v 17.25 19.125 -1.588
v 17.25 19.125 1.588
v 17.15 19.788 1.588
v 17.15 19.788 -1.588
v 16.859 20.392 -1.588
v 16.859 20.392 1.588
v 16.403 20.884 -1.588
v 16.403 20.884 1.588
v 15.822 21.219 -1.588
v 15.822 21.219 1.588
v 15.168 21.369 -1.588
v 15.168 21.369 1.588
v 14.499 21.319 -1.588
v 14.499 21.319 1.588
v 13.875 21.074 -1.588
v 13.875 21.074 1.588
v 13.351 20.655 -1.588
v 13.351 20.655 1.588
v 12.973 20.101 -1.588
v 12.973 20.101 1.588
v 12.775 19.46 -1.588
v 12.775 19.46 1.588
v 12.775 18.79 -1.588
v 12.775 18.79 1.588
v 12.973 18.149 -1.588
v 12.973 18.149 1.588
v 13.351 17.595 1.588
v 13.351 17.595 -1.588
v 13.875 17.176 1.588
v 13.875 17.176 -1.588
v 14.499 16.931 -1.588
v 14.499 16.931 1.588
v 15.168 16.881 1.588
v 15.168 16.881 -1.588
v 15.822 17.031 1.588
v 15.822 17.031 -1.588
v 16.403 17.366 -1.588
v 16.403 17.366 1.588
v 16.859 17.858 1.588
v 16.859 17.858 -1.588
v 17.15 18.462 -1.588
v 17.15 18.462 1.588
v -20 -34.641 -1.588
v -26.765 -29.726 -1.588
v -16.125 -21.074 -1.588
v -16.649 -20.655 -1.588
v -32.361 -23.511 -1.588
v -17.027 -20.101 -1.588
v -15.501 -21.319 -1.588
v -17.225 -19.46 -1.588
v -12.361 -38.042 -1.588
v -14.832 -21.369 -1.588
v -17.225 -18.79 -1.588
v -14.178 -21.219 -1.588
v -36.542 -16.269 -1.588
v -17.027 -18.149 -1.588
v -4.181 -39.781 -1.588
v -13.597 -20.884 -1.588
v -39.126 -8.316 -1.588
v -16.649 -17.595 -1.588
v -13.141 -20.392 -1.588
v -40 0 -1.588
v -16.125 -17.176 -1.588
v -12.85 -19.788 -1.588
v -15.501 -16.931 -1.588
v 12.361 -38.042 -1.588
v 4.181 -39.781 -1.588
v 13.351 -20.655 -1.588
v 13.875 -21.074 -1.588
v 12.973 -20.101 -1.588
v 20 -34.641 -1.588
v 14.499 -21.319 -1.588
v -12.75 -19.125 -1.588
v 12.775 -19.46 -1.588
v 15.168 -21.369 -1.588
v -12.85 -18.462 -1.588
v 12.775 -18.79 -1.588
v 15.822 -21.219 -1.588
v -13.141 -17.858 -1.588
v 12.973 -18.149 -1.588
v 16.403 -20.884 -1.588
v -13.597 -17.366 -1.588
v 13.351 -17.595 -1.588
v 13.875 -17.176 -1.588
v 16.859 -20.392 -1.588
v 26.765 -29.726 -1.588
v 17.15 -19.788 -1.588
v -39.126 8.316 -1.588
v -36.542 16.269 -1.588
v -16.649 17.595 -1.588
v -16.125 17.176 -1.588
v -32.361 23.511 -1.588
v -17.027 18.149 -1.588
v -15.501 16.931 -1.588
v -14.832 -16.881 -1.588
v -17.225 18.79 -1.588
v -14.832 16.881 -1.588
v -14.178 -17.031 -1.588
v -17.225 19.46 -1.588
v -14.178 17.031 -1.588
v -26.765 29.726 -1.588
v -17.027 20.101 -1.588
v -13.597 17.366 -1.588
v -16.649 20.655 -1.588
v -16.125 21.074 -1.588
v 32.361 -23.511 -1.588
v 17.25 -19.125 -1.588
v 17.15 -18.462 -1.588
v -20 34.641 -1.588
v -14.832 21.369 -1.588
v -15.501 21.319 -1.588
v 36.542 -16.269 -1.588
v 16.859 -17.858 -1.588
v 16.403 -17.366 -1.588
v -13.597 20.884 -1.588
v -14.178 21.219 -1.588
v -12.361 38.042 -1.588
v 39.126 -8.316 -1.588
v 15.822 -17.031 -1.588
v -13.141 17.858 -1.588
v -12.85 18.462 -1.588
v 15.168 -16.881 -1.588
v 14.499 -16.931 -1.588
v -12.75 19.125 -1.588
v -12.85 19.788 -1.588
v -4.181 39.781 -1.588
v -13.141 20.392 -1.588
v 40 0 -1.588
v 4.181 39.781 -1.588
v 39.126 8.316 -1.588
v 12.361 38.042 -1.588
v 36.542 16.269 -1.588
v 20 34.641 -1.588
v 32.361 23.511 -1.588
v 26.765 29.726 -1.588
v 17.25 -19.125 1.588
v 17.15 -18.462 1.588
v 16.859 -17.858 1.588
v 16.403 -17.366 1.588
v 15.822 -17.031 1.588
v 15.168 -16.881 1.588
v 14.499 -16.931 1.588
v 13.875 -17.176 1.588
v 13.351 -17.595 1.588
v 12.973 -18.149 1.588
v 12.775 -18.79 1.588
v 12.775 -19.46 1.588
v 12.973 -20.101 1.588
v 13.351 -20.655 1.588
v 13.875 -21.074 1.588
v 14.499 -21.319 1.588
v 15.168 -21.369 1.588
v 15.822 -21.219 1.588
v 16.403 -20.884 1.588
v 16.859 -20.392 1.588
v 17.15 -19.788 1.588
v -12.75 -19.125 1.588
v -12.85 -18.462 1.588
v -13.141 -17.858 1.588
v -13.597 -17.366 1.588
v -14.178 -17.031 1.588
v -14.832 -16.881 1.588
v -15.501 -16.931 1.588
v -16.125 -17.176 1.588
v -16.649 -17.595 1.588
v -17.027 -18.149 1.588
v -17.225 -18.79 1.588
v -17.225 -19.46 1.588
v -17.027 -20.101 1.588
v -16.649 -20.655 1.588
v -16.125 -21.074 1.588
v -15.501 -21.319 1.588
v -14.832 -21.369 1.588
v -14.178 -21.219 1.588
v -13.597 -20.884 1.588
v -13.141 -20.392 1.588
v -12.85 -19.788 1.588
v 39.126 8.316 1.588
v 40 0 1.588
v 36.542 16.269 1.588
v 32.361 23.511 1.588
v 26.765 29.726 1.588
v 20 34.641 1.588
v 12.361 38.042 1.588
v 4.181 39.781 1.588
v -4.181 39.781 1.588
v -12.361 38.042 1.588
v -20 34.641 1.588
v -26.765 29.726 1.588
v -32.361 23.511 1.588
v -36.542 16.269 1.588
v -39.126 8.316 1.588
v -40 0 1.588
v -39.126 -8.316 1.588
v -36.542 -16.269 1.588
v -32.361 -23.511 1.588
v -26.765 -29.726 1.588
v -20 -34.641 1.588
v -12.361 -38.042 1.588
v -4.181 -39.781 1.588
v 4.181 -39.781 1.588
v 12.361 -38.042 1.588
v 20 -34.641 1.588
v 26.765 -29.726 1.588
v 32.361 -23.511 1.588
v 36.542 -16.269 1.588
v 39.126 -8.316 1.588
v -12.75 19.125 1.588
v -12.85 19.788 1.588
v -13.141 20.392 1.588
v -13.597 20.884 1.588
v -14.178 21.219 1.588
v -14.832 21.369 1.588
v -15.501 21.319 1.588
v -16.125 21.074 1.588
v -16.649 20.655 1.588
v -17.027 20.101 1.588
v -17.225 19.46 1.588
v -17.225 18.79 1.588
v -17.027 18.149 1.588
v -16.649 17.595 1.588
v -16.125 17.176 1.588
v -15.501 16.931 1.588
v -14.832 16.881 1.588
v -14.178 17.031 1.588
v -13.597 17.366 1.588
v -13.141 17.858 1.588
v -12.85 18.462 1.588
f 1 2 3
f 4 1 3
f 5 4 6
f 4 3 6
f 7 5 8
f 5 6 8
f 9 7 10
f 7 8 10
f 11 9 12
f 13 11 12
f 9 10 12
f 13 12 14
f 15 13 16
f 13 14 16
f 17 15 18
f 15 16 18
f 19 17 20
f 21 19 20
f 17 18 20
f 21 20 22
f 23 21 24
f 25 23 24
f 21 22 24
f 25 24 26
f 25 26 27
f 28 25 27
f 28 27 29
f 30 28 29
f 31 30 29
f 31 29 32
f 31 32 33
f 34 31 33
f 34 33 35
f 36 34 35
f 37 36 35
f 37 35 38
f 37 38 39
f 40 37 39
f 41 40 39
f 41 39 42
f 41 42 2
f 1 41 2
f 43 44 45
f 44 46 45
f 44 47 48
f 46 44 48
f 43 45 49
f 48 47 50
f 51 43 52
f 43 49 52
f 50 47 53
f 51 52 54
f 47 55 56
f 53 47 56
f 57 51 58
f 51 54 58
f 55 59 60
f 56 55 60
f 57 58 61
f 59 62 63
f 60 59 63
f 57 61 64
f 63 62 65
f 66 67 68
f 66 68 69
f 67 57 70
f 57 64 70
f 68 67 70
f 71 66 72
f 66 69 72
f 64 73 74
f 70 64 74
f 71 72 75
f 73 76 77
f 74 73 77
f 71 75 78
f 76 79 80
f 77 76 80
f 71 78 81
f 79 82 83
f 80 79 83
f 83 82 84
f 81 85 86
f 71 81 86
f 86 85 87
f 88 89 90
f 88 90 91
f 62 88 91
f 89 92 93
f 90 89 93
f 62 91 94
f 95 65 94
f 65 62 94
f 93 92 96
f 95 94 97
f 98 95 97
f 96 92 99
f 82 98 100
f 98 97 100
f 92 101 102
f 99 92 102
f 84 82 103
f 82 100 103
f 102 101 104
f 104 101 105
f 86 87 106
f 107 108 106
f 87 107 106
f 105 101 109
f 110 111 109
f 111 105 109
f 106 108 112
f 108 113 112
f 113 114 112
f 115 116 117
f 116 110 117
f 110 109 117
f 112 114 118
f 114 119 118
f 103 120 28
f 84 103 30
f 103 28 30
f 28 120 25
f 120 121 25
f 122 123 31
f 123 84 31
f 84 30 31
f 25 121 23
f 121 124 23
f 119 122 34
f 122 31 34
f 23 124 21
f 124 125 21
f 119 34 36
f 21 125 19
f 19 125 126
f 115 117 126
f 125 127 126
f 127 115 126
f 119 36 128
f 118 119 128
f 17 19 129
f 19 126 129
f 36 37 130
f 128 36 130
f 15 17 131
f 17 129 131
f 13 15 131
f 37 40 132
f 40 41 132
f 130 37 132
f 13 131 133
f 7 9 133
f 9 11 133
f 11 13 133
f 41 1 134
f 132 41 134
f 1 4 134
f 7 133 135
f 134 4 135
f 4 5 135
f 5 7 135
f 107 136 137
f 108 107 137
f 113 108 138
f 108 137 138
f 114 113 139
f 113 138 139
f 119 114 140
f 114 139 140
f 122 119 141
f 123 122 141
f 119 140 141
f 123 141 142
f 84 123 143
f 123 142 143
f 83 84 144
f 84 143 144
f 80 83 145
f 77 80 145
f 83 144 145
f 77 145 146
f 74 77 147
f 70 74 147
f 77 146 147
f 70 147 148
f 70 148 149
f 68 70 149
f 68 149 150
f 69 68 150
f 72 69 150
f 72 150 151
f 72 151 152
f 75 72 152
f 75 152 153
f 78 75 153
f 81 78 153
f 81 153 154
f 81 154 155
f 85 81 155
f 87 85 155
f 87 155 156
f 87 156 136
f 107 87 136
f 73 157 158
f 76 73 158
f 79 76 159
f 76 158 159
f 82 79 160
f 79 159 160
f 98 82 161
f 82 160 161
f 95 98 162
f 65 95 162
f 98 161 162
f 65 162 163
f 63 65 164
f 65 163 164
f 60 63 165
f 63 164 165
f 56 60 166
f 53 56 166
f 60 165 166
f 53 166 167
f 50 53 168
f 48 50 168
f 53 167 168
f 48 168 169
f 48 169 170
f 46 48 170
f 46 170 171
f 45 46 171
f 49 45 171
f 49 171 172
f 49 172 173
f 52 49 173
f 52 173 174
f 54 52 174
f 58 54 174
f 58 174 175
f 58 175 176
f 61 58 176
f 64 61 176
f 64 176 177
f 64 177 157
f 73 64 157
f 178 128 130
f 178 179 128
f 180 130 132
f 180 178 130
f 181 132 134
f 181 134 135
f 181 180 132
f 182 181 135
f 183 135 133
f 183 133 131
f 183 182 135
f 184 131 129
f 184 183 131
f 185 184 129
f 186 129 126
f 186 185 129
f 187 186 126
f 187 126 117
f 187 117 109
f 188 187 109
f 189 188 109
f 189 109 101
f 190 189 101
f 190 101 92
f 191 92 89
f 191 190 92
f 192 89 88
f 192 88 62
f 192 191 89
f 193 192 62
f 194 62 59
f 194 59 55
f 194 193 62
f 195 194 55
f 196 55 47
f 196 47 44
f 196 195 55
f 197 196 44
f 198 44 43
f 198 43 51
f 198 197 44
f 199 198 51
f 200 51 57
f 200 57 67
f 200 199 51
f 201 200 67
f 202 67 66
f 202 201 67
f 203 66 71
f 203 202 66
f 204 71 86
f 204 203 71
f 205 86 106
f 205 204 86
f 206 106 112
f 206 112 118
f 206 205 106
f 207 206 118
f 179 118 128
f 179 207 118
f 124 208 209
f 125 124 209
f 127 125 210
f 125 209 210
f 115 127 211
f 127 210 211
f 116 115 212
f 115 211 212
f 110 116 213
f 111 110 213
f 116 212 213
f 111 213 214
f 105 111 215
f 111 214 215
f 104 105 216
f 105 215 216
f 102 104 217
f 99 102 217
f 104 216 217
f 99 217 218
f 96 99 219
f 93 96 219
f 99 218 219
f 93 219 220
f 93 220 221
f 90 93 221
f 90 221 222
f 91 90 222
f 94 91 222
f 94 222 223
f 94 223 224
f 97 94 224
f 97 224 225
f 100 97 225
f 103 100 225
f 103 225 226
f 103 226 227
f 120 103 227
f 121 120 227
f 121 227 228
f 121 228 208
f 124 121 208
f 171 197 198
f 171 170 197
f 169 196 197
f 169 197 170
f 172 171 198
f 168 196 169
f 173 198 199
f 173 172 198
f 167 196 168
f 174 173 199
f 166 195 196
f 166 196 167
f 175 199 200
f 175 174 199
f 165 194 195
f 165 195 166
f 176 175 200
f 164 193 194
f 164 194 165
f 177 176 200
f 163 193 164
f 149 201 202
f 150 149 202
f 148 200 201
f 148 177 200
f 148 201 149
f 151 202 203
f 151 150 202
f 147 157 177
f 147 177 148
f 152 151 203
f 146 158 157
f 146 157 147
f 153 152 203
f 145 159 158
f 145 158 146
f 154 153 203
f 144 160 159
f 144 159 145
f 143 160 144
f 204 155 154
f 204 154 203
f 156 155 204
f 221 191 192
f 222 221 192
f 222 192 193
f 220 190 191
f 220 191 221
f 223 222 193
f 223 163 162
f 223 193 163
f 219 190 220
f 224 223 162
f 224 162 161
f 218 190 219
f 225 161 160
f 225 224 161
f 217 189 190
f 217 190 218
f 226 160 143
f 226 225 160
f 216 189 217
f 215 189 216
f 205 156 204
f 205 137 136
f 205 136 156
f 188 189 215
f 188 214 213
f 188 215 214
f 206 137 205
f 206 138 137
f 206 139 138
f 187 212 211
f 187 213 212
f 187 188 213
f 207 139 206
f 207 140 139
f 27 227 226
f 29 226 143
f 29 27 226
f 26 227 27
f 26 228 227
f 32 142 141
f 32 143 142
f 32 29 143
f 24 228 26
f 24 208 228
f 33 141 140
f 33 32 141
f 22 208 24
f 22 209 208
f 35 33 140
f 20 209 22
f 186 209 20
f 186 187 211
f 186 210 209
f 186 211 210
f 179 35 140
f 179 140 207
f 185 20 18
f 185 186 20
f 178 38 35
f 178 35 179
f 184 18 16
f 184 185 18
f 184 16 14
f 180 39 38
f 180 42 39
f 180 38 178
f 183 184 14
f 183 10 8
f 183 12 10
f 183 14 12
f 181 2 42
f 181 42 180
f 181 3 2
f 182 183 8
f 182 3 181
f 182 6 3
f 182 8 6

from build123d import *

# Parameters (mm, degrees)
SKETCH1_R            = 40
BOSS_EXTRUDE1_DEPTH  = 1.5875
M4_CLEARANCE_HOLE1_D = 4.5


with BuildPart() as part:
    # Sketch1 → Boss-Extrude1 (new body, symmetric)
    with BuildSketch(Plane.XY):
        Circle(SKETCH1_R)
    extrude(amount=BOSS_EXTRUDE1_DEPTH, both=True)

    # M4 Clearance Hole1 (through all)
    with Locations(Plane(origin=(0, 0, -1.5875), x_dir=(-1, 0, 0), z_dir=(0, 0, -1))):
        with Locations((15, 19.125), (-15, 19.125), (-15, -19.125), (15, -19.125)):
            Hole(M4_CLEARANCE_HOLE1_D / 2)


solid = part.part
